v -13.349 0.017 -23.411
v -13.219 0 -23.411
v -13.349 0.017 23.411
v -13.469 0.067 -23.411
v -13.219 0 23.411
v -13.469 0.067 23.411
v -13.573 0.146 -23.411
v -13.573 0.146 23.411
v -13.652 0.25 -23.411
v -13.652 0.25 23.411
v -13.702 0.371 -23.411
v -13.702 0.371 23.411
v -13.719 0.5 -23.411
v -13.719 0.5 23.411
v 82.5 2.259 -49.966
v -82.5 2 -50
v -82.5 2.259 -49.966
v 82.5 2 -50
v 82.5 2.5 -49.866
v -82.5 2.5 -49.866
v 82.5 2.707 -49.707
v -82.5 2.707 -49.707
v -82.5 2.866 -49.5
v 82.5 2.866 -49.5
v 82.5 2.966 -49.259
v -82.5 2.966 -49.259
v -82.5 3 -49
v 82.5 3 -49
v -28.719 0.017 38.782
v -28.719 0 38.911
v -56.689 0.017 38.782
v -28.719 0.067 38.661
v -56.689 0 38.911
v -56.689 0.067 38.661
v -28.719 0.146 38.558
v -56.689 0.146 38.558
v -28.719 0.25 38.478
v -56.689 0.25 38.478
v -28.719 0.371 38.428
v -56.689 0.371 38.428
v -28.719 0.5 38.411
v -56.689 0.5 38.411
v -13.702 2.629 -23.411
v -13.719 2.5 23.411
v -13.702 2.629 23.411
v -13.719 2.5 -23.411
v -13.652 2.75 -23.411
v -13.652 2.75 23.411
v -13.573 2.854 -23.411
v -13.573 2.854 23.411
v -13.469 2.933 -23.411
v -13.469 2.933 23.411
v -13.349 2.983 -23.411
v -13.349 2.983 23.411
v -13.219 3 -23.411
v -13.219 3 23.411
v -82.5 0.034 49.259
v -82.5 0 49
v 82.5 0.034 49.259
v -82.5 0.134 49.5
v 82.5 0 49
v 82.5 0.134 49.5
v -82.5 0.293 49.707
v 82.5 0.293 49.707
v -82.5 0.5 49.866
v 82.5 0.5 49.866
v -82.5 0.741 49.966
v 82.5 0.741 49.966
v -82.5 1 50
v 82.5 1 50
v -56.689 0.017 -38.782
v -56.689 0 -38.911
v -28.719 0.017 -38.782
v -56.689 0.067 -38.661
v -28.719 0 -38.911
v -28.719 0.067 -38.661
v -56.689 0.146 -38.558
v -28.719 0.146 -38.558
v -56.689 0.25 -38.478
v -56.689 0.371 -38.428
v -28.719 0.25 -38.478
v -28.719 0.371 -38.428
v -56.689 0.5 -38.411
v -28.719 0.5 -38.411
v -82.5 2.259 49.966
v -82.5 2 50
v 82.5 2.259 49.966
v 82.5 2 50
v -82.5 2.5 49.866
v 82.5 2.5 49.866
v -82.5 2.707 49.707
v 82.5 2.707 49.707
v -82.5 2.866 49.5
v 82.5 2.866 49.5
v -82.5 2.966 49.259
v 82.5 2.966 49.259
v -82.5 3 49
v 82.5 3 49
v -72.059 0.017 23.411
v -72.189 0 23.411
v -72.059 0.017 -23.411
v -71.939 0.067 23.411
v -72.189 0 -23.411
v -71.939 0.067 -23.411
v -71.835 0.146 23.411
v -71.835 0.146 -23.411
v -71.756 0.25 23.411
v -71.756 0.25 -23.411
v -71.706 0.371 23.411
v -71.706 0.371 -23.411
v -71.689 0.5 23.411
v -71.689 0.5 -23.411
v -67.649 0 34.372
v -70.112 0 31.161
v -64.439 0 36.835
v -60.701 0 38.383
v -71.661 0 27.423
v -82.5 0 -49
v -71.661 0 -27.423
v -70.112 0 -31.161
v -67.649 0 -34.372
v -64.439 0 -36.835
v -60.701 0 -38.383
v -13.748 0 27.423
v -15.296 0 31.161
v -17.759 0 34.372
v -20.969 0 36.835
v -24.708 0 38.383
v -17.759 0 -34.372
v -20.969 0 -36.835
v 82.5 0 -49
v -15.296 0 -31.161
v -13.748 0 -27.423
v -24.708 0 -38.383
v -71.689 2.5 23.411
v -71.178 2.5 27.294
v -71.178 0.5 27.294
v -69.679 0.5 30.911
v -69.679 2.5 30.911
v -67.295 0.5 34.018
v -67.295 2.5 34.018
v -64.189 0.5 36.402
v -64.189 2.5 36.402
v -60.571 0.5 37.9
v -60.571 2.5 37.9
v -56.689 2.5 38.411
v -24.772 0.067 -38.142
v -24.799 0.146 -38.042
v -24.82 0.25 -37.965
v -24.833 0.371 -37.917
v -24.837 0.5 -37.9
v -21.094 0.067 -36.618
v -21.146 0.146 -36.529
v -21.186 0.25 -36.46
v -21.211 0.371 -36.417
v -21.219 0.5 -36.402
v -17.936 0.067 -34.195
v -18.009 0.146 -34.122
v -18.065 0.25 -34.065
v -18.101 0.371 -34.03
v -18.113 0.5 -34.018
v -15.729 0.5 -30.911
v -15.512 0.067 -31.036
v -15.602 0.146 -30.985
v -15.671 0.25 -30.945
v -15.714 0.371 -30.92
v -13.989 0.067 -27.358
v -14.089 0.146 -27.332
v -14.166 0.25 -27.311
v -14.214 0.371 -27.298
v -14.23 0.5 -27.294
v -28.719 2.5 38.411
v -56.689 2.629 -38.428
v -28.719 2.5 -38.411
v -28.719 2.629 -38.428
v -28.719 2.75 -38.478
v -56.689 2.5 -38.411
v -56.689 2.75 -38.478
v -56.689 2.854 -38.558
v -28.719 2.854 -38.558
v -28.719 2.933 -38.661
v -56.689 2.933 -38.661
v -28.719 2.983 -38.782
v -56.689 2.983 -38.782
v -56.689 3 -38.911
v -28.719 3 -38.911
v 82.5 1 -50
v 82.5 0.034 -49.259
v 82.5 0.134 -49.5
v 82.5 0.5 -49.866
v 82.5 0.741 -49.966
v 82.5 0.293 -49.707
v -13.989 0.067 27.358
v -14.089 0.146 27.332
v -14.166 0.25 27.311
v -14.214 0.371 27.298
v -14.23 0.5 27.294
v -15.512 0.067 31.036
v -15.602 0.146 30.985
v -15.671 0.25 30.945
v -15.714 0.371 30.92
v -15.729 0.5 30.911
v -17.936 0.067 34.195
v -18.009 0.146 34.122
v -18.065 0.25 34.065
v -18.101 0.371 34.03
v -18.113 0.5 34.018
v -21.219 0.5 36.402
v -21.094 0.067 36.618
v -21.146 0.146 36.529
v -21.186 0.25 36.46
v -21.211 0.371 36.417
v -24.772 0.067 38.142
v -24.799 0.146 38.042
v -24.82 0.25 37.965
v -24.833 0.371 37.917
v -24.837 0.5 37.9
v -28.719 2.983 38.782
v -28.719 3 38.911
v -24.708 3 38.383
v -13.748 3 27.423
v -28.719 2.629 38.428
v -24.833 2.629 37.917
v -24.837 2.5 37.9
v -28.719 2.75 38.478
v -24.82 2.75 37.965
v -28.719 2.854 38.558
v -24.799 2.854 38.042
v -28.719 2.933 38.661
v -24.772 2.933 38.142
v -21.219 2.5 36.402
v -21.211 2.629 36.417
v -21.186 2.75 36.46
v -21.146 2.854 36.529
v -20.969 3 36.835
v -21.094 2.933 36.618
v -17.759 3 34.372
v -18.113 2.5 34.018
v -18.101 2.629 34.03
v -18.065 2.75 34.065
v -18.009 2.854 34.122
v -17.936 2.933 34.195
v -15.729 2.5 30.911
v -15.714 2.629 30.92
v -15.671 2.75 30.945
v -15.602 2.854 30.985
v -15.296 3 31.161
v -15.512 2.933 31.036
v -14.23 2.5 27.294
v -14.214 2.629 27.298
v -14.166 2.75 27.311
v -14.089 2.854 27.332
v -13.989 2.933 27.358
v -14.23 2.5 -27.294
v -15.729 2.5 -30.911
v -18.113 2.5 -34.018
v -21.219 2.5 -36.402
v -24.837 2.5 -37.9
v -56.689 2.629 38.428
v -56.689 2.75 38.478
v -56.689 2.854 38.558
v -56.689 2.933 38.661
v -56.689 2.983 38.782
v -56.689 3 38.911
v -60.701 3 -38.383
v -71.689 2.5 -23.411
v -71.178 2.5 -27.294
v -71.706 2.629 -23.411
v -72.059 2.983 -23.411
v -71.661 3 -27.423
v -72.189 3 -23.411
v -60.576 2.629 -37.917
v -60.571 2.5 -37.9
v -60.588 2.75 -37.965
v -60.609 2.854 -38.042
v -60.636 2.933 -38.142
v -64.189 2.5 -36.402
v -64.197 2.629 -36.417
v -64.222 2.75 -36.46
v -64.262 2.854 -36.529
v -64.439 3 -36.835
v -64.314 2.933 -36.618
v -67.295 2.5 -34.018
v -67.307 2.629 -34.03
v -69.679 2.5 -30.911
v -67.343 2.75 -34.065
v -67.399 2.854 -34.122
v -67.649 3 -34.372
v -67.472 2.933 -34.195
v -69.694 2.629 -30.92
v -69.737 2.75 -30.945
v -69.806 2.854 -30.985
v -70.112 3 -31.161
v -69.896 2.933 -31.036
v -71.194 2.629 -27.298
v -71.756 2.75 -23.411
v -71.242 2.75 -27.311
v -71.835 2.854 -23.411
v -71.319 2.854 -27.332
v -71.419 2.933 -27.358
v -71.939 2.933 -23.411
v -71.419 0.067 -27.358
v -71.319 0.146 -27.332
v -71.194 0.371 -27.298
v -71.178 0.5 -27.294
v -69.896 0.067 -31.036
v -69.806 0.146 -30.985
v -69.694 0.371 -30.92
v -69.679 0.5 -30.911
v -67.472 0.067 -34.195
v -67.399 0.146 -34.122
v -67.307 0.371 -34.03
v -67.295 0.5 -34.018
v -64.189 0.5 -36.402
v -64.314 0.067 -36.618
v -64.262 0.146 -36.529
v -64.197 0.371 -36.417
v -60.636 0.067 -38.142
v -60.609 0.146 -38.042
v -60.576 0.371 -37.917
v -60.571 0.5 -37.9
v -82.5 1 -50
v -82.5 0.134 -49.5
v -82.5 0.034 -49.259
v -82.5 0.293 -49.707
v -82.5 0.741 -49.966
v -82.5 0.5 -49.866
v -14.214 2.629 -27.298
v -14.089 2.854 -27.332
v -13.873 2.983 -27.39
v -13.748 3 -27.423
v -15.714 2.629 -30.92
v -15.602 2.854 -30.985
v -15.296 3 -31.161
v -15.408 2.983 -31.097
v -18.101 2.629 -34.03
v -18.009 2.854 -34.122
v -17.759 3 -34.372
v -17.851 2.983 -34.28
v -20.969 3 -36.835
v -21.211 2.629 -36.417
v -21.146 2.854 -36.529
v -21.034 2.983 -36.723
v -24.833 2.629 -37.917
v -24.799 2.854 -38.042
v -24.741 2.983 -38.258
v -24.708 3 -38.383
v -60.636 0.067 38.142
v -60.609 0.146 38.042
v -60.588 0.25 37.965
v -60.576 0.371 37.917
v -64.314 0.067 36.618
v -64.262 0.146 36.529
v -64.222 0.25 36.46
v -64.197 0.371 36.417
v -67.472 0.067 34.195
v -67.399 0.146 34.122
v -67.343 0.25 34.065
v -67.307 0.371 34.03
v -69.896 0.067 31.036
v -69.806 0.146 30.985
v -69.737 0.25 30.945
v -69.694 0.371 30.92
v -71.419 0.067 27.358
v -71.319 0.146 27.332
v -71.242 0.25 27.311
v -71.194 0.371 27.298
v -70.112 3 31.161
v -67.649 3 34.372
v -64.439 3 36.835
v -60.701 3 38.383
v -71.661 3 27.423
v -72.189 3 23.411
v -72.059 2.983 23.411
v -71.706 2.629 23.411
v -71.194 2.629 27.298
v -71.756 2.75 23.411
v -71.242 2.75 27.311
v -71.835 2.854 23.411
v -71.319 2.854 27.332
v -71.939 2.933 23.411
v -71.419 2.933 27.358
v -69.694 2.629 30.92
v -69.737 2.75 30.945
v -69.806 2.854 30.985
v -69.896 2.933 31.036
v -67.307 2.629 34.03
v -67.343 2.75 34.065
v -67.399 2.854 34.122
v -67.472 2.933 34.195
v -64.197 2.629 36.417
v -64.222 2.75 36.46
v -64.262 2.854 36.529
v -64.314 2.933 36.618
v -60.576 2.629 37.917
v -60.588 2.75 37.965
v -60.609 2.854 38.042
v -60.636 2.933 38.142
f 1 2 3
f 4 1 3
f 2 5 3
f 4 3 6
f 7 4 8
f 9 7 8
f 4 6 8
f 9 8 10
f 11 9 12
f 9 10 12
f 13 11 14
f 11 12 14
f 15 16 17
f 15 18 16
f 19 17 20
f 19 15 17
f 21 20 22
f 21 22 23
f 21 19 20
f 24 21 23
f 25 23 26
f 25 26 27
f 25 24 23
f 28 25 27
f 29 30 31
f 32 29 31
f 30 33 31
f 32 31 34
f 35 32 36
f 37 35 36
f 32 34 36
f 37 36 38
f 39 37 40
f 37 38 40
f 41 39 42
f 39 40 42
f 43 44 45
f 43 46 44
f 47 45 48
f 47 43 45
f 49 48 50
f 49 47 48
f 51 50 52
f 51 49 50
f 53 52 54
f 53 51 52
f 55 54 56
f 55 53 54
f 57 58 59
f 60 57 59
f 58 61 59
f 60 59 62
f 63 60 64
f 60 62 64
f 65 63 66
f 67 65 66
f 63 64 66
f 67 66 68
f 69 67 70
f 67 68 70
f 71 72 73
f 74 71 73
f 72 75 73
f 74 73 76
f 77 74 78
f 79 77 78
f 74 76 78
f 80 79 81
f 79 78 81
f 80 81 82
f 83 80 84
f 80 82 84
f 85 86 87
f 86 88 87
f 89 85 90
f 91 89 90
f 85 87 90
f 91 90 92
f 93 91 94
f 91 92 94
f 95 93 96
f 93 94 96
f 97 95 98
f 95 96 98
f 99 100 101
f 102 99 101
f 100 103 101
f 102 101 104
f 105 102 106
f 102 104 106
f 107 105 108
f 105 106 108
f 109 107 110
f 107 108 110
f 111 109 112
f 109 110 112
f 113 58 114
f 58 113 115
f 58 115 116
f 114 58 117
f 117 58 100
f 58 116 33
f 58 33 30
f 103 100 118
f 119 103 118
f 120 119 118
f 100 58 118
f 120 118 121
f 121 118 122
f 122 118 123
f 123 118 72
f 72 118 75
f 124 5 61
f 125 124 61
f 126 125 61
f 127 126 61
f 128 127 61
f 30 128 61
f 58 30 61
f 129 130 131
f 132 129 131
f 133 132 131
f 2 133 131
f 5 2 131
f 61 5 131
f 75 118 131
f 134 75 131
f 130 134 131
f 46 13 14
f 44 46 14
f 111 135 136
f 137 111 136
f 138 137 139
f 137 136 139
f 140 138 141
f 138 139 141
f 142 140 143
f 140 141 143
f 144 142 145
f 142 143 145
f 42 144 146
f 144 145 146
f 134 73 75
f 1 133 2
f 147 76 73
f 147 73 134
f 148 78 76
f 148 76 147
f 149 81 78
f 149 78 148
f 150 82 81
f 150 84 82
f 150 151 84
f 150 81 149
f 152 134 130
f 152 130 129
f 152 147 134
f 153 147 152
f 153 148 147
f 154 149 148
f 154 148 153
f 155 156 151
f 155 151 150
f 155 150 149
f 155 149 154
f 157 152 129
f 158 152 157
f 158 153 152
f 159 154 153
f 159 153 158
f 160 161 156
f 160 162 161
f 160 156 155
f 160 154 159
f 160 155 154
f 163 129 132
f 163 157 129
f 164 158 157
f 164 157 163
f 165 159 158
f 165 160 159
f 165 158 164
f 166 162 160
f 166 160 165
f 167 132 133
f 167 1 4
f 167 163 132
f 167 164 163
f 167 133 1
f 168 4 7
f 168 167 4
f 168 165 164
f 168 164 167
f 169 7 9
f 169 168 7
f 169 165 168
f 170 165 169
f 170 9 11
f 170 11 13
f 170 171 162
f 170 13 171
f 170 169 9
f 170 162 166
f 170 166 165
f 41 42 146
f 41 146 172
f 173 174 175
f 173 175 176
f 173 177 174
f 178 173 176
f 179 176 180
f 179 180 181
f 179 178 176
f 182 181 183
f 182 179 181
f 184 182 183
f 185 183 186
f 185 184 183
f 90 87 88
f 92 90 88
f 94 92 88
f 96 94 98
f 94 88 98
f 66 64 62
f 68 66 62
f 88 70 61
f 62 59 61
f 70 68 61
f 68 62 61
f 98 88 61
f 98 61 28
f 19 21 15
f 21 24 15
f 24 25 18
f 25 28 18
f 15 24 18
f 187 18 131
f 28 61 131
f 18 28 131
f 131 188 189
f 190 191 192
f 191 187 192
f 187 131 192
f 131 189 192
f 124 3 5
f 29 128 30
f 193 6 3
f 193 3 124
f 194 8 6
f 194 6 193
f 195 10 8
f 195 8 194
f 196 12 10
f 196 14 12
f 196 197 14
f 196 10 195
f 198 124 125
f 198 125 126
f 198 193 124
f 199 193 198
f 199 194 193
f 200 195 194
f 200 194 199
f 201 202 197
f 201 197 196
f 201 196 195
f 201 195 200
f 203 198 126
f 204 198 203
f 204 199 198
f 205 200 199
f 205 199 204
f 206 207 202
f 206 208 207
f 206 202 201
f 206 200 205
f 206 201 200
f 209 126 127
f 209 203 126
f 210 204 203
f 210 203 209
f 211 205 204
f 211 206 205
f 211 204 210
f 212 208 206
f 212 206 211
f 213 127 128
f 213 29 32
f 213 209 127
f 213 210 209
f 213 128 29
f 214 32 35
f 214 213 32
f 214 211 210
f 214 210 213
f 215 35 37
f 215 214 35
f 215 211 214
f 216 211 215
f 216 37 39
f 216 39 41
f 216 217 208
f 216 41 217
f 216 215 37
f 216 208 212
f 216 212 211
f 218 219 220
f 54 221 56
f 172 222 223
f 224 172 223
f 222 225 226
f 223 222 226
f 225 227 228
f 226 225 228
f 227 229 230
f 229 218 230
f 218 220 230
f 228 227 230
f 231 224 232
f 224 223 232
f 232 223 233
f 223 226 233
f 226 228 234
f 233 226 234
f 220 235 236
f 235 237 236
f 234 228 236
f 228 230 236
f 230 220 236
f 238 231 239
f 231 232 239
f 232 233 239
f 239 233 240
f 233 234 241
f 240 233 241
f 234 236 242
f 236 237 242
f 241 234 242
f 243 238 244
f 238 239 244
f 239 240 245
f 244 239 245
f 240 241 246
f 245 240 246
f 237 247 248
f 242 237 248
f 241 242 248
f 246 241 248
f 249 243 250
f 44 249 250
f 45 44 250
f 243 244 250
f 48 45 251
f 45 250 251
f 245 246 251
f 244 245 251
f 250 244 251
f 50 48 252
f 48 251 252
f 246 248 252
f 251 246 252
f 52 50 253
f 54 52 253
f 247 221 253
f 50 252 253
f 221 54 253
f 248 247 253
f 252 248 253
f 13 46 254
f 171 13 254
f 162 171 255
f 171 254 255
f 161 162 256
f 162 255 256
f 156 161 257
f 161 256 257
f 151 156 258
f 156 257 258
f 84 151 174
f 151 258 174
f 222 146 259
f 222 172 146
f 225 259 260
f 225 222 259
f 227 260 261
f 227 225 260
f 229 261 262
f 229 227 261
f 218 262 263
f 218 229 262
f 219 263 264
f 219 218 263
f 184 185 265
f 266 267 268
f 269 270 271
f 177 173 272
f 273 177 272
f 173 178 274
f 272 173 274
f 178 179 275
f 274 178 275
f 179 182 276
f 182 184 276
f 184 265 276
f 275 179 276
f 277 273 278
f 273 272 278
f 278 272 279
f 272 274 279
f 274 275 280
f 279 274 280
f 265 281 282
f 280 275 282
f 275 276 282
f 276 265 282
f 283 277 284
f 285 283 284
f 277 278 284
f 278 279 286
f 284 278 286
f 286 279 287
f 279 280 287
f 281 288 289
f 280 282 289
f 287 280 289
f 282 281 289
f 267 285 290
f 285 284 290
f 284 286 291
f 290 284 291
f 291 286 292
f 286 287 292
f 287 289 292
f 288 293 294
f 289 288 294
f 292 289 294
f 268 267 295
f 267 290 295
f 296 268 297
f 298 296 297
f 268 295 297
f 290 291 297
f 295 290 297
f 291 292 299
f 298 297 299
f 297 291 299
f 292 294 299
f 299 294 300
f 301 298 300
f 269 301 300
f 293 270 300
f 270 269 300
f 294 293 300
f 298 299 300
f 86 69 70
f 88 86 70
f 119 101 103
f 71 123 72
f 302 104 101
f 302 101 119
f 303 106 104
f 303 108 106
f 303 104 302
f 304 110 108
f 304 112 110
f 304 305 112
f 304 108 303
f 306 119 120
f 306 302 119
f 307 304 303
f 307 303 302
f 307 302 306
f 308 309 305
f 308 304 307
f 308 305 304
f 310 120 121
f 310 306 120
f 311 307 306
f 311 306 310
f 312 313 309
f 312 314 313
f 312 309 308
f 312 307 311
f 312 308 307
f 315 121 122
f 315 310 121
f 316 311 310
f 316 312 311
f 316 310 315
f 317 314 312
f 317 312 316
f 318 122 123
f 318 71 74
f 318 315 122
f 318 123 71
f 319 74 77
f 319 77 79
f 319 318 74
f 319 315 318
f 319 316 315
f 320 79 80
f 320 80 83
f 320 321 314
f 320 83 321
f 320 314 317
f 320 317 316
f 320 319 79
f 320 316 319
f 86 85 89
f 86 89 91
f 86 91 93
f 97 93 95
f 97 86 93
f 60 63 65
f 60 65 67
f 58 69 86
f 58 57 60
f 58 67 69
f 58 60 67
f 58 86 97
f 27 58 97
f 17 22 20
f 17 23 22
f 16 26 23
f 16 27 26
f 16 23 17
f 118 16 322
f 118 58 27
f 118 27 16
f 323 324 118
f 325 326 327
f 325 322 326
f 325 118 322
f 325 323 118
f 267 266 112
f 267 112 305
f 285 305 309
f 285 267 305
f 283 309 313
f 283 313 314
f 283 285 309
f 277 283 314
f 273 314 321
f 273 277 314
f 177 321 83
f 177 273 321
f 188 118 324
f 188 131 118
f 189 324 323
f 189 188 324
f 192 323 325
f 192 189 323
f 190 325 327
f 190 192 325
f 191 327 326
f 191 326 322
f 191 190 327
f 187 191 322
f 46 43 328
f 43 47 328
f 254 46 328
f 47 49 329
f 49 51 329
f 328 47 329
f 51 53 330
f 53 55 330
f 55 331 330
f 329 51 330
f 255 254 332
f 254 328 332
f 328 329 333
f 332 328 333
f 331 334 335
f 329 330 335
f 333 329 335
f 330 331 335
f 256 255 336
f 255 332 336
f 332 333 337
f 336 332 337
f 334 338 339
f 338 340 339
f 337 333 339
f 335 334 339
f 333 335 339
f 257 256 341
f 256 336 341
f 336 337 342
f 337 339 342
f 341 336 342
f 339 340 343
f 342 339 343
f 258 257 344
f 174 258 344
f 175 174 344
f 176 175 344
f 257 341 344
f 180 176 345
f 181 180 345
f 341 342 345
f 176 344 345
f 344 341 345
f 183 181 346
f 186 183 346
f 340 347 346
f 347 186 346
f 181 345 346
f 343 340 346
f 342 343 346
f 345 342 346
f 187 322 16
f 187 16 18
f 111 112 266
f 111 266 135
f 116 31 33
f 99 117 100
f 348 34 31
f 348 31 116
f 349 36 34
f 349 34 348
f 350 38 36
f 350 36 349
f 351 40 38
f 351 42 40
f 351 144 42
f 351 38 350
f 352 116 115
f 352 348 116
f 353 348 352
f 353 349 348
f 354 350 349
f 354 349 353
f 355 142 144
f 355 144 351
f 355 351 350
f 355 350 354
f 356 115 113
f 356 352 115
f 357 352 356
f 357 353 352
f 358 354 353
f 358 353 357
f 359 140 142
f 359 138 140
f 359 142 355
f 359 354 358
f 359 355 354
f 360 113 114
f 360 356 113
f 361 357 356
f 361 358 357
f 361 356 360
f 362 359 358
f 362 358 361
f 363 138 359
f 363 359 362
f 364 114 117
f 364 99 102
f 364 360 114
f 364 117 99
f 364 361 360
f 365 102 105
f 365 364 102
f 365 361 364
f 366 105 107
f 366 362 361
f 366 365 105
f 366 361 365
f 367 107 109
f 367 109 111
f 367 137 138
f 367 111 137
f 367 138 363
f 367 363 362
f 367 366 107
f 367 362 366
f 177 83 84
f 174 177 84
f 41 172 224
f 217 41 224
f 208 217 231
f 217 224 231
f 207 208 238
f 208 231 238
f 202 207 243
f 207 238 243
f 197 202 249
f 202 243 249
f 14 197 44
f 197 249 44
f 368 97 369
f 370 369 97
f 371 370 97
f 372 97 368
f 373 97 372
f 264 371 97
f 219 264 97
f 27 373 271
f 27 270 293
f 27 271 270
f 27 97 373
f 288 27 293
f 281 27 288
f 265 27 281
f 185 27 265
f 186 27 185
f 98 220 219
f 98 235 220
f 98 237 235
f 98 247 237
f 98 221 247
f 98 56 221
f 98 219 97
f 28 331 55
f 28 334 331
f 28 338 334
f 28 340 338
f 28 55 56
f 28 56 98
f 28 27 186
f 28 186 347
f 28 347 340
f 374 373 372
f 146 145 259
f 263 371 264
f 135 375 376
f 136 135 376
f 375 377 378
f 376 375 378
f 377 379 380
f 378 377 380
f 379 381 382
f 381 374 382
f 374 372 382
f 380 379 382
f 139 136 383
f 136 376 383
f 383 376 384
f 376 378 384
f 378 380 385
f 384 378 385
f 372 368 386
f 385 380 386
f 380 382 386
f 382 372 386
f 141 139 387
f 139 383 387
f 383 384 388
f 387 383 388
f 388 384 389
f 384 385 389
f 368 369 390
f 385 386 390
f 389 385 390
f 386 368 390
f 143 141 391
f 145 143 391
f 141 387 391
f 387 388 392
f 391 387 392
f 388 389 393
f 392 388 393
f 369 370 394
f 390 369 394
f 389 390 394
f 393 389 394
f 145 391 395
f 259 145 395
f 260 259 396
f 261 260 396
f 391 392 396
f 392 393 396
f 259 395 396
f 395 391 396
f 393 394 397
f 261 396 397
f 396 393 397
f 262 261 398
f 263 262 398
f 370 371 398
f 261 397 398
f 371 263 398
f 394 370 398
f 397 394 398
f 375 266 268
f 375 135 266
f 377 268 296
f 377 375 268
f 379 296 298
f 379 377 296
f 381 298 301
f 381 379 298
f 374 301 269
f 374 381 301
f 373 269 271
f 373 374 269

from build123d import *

# Parameters (mm, degrees)
SKETCH_1_W          = 165
SKETCH_1_H          = 100
EXTRUDE_1_DEPTH     = 3
SKETCH_2_W          = 57.969471509
SKETCH_2_H          = 76.82290634
CUT_EXTRUDE_1_DEPTH = 97.51554279
FILLET_1_R          = 15
FILLET_2_R          = 1
FILLET_3_R          = 0.5


with BuildPart() as part:
    # 草图1 → 凸台-拉伸1 (new body)
    with BuildSketch(Plane(origin=(0, 0, 0), x_dir=(1, 0, 0), z_dir=(0, 1, 0))):
        Rectangle(SKETCH_1_W, SKETCH_1_H)
    extrude(amount=EXTRUDE_1_DEPTH)

    # 草图2 → 切除-拉伸1 (cut, through all)
    with BuildSketch(Plane.XZ):
        with Locations((-42.70408642, 0)):
            Rectangle(SKETCH_2_W, SKETCH_2_H)
    extrude(amount=-CUT_EXTRUDE_1_DEPTH, mode=Mode.SUBTRACT)

    # 圆角1
    fillet_1_edges = [part.edges().sort_by_distance(p)[0] for p in [
        (-13.719350665, 1.5, 38.41145317),
        (-13.719350665, 1.5, -38.41145317),
        (-71.688822174, 1.5, -38.41145317),
        (-71.688822174, 1.5, 38.41145317),
    ]]
    fillet(fillet_1_edges, radius=FILLET_1_R)

    # 圆角2
    fillet_2_edges = [part.edges().sort_by_distance(p)[0] for p in [
        (0, 3, 50),
        (0, 0, 50),
        (0, 0, -50),
        (0, 3, -50),
    ]]
    fillet(fillet_2_edges, radius=FILLET_2_R)

    # 圆角3
    fillet_3_edges = [part.edges().sort_by_distance(p)[0] for p in [
        (-42.704086419, 0, -38.41145317),
        (-42.704086419, 3, -38.41145317),
        (-71.688822174, 0, 0),
        (-71.688822174, 3, 0),
        (-42.704086419, 0, 38.41145317),
        (-42.704086419, 3, 38.41145317),
        (-13.719350665, 0, 0),
        (-13.719350665, 3, 0),
        (-67.295423892, 0, -34.018054888),
        (-67.295423892, 3, -34.018054888),
        (-67.295423892, 0, 34.018054888),
        (-67.295423892, 3, 34.018054888),
        (-18.112748947, 0, -34.018054888),
        (-18.112748947, 3, -34.018054888),
        (-18.112748947, 0, 34.018054888),
        (-18.112748947, 3, 34.018054888),
    ]]
    fillet(fillet_3_edges, radius=FILLET_3_R)


solid = part.part
